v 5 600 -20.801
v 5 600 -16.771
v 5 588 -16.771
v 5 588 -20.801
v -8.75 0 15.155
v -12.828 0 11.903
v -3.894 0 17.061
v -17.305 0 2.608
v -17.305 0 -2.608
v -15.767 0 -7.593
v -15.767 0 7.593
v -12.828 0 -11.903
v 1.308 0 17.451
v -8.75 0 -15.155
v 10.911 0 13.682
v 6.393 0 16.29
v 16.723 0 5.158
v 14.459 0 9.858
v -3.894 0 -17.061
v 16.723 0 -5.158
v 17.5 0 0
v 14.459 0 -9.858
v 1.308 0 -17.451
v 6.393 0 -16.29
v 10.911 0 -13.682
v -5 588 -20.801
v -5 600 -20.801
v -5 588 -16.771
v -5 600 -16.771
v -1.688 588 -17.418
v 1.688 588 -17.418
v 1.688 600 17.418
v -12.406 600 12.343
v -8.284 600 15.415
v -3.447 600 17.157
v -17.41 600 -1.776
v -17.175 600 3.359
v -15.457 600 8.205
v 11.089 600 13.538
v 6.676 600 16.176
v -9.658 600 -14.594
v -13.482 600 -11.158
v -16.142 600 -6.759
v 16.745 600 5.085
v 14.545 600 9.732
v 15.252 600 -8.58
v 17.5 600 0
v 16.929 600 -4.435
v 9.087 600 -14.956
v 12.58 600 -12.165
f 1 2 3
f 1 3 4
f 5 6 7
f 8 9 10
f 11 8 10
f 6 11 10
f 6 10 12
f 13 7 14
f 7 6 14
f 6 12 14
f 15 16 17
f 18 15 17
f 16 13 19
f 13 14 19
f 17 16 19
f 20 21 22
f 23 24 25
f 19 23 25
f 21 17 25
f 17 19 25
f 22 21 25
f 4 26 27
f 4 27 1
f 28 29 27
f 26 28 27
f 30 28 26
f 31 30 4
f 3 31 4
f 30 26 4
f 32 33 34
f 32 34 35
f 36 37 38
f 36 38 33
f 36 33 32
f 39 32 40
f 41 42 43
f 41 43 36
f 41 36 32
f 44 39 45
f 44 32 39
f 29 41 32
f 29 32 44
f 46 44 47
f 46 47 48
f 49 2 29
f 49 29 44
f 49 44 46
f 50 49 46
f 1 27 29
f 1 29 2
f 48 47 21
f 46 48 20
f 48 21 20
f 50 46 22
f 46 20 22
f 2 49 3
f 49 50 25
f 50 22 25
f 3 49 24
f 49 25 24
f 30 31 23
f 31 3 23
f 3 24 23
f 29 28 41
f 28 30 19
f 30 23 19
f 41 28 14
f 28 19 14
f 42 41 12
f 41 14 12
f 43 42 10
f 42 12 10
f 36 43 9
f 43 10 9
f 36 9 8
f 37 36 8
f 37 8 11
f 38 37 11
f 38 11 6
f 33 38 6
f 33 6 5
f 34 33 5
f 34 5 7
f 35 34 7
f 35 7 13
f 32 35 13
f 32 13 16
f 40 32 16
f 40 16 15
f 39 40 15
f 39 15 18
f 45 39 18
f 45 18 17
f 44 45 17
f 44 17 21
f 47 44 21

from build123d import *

# Parameters (mm, degrees)
SKETCH1_R           = 17.5
BOSS_EXTRUDE1_DEPTH = 600
SKETCH5_W           = 10
SKETCH5_H           = 4.03
BOSS_EXTRUDE2_DEPTH = 12


with BuildPart() as part:
    # Sketch1 → Boss-Extrude1 (new body)
    with BuildSketch(Plane(origin=(0, 0, 0), x_dir=(1, 0, 0), z_dir=(0, 1, 0))):
        Circle(SKETCH1_R)
    extrude(amount=BOSS_EXTRUDE1_DEPTH)

    # Sketch5 → Boss-Extrude2 (add)
    with BuildSketch(Plane(origin=(0, 600, 0), x_dir=(1, 0, 0), z_dir=(0, 1, 0))):
        with Locations((0, 18.78551)):
            Rectangle(SKETCH5_W, SKETCH5_H)
    extrude(amount=-BOSS_EXTRUDE2_DEPTH)


solid = part.part
